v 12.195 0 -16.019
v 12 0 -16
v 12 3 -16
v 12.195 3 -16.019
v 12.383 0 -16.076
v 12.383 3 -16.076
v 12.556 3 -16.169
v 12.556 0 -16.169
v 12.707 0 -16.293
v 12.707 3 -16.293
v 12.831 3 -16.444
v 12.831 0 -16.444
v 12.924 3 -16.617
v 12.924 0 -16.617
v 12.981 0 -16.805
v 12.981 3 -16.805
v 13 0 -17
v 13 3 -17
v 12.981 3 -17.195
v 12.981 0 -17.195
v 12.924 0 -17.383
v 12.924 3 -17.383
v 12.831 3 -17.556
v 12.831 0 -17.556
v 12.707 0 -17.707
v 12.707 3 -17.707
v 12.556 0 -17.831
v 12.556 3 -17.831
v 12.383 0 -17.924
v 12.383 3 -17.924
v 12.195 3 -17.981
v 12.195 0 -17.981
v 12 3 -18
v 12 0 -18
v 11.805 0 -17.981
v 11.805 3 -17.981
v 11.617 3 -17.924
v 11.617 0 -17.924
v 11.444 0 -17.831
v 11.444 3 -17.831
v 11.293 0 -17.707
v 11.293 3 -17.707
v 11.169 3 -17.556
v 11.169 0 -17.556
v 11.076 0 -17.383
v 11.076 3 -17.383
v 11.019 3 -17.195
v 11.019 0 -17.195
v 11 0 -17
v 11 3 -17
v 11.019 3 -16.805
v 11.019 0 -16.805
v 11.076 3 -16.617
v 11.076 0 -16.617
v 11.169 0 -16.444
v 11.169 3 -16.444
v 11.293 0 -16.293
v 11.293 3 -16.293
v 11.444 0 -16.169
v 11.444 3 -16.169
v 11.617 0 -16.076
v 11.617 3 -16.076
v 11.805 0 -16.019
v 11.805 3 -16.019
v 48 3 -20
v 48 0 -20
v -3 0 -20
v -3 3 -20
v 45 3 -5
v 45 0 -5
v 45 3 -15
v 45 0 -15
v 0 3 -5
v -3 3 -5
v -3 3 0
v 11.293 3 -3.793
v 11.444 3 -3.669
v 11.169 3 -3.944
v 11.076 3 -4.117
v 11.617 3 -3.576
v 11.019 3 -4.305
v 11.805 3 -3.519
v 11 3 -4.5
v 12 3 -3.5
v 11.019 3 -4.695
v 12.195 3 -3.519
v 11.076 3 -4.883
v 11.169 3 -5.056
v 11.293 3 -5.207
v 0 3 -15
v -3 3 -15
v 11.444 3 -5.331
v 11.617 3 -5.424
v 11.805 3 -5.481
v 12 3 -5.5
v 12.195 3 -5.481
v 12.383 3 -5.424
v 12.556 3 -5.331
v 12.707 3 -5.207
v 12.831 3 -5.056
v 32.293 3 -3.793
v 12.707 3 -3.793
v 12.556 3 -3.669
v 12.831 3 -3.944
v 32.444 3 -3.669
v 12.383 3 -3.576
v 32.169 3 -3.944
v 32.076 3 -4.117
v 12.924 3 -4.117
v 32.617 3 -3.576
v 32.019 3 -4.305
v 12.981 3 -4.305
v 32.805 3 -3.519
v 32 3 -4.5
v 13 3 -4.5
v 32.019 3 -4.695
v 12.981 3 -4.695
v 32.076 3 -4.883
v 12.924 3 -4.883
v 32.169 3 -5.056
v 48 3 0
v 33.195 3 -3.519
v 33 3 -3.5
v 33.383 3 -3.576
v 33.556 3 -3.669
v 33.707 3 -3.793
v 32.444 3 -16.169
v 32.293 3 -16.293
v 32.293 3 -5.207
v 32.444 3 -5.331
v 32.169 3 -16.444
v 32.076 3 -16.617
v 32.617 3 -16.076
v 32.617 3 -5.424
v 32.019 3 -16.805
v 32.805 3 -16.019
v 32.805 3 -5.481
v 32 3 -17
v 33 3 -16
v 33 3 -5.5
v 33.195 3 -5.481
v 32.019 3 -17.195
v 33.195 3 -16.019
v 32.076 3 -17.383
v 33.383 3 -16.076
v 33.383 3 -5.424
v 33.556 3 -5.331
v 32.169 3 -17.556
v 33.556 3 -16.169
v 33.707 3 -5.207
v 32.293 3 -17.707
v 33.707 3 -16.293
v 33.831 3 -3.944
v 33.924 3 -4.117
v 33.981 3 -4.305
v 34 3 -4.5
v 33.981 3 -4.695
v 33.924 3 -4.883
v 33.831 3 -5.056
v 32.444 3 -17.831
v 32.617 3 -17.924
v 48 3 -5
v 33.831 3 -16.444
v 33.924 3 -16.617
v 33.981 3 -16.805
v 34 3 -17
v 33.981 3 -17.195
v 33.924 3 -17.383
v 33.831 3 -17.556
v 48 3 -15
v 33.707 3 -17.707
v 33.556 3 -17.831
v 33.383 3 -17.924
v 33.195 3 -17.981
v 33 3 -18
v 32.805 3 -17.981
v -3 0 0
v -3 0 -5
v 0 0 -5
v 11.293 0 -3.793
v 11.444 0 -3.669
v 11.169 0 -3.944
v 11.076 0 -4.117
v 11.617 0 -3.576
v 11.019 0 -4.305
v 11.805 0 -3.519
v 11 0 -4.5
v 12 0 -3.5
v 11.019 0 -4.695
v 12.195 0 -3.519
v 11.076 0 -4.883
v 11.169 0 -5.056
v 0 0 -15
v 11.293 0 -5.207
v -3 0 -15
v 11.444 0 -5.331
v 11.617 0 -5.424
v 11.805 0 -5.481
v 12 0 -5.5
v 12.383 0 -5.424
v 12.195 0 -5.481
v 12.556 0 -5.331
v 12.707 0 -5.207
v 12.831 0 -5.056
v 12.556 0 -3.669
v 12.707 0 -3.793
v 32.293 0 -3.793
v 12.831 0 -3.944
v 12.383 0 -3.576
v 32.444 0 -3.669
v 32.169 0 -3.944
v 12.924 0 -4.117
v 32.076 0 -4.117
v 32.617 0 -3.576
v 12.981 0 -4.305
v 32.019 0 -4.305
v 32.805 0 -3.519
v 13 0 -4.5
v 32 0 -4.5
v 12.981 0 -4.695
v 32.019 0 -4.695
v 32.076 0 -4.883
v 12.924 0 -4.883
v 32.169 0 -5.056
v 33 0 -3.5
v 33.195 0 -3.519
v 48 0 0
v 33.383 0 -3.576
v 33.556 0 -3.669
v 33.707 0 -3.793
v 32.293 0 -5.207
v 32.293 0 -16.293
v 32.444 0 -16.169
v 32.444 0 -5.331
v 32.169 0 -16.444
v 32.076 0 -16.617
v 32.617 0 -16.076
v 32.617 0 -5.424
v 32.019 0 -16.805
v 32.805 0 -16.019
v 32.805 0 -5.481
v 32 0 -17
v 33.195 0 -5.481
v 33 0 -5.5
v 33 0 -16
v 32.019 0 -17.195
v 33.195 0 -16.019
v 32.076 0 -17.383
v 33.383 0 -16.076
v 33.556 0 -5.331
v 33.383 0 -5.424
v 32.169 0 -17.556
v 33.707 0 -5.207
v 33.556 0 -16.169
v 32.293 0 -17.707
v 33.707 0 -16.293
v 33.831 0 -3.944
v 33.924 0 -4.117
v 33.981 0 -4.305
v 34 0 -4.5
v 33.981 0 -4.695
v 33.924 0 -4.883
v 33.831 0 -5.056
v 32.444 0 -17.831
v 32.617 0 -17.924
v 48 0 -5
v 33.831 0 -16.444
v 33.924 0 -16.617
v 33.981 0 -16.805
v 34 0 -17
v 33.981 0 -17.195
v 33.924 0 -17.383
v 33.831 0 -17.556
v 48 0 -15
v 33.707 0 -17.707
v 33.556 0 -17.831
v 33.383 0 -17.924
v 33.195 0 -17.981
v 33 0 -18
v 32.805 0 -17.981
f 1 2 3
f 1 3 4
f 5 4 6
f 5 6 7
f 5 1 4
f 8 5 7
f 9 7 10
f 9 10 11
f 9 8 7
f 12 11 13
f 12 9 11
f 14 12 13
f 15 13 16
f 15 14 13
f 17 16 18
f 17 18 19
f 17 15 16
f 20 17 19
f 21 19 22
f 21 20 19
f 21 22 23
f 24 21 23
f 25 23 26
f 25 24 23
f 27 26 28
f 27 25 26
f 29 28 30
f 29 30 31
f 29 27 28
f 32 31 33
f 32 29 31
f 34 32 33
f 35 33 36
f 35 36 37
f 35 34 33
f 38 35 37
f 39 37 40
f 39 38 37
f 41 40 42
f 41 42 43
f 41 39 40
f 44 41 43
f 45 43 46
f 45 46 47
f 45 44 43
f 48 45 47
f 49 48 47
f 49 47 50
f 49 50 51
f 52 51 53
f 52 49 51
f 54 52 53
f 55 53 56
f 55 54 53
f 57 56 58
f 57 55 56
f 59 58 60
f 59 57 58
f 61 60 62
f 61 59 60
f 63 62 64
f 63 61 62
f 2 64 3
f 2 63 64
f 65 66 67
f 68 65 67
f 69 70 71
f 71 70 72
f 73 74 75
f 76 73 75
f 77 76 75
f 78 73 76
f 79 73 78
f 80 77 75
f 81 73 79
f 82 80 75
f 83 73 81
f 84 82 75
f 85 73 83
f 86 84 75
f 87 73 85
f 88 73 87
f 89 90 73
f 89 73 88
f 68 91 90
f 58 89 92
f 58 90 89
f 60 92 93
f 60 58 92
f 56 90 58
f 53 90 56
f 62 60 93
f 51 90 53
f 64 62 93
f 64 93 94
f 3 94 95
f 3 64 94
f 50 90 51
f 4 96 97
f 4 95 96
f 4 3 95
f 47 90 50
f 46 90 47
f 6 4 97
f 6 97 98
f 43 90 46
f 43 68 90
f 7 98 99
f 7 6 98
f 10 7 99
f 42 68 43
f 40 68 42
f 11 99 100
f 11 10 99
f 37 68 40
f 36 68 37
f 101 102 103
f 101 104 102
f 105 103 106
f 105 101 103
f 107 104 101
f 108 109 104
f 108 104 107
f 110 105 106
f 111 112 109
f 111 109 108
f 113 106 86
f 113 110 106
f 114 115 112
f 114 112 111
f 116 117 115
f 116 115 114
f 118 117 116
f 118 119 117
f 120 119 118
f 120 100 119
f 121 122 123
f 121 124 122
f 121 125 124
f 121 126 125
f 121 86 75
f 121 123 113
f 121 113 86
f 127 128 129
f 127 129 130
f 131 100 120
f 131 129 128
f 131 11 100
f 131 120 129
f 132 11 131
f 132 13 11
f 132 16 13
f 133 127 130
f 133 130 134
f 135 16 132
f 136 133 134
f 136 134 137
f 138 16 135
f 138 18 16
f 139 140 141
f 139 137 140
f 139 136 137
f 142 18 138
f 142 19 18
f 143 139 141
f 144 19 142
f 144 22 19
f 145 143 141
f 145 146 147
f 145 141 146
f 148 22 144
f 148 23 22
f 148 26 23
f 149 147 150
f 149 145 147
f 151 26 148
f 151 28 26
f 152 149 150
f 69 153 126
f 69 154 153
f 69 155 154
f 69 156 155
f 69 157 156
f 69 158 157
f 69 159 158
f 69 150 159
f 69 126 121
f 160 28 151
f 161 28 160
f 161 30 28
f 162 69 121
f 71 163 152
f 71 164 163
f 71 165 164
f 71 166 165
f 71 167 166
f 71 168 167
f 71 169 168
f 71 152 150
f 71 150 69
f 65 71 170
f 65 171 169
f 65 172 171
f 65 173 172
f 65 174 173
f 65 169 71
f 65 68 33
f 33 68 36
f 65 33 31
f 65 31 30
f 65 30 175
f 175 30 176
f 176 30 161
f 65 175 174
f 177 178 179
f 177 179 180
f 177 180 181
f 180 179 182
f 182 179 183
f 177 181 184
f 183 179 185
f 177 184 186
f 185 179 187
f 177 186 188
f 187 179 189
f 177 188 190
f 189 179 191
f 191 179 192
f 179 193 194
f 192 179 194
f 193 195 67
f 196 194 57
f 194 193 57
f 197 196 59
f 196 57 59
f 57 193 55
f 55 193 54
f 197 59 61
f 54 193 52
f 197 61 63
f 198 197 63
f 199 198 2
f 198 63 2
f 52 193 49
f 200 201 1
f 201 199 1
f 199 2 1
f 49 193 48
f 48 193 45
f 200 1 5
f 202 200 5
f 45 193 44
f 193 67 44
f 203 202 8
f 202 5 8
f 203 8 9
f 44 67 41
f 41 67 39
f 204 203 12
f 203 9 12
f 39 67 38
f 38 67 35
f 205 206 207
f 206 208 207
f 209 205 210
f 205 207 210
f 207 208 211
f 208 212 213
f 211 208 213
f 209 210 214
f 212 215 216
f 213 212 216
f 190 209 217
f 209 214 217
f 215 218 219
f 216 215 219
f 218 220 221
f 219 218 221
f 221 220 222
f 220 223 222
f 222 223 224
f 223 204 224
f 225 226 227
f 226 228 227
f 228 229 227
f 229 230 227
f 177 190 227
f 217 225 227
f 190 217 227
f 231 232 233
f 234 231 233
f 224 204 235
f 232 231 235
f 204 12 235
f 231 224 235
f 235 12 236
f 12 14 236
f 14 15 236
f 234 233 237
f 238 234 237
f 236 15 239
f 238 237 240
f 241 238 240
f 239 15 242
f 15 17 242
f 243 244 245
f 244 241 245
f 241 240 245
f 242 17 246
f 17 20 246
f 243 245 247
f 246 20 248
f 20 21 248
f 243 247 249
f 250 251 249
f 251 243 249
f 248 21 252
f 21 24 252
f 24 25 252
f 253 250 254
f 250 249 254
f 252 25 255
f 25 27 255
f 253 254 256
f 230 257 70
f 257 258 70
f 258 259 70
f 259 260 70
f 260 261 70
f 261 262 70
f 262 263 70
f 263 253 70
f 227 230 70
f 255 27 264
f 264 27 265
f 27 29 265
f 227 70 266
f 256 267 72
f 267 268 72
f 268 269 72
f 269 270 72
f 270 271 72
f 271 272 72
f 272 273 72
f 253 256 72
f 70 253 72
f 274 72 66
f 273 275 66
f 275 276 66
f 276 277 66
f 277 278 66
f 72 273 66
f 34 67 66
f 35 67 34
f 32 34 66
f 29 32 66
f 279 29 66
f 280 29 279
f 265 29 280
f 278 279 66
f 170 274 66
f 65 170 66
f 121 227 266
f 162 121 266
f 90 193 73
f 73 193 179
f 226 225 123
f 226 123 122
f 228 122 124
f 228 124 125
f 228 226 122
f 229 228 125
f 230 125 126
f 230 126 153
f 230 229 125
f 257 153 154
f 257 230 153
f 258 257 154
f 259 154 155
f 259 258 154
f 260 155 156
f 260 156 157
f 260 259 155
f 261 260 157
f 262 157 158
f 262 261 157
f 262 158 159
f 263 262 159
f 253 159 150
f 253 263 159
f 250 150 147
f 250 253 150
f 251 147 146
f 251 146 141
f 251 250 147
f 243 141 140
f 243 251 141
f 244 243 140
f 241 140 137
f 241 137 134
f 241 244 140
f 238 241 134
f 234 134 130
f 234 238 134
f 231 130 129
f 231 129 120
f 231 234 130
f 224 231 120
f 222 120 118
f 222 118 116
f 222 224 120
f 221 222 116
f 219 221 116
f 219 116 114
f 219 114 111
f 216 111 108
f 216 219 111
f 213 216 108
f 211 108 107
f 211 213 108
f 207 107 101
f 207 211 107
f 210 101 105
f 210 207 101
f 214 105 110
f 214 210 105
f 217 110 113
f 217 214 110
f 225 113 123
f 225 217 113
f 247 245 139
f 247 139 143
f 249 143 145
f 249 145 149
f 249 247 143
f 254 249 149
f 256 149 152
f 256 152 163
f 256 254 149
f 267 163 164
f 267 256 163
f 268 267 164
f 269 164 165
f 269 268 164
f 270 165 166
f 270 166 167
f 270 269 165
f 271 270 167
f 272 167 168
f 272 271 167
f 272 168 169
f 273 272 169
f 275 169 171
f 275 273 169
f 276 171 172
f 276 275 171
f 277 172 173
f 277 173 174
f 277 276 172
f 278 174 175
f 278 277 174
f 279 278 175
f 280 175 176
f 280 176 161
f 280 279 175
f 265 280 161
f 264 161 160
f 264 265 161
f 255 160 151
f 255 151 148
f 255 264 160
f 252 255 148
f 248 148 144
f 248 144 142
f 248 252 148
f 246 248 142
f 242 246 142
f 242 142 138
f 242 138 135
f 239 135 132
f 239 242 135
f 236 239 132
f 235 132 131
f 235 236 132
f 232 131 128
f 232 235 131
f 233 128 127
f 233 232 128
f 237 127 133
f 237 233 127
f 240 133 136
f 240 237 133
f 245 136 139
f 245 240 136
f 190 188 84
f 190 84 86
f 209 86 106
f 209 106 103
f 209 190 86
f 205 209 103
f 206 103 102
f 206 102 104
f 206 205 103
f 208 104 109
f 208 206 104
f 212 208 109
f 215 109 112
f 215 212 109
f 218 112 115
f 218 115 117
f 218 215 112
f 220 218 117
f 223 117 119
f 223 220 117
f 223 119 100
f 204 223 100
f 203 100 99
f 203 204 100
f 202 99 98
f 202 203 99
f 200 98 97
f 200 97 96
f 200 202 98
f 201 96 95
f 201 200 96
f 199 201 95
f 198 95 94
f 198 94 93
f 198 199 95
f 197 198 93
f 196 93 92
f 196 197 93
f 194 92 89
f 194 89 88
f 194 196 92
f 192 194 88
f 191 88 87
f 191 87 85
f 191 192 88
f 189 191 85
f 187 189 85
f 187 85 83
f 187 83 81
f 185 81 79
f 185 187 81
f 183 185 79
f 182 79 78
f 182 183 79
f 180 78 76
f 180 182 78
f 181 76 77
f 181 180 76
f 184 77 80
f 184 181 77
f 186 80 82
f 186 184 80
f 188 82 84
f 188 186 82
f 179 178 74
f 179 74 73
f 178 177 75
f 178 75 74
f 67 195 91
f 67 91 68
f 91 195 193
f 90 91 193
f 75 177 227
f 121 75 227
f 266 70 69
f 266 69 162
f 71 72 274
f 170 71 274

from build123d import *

# Parameters (mm, degrees)
SKETCH1_W           = 3
SKETCH1_H           = 5
SKETCH1_R           = 1
BOSS_EXTRUDE1_DEPTH = 3


with BuildPart() as part:
    # Sketch1 → Boss-Extrude1 (new body)
    # profile 1 of 6: a face of its own
    with BuildSketch(Plane(origin=(0, 0, 0), x_dir=(1, 0, 0), z_dir=(0, 1, 0))):
        with Locations((-1.5, 17.5)):
            Rectangle(SKETCH1_W, SKETCH1_H)
    # profile 2 of 6: a face of its own
    with BuildSketch(Plane(origin=(0, 0, 0), x_dir=(1, 0, 0), z_dir=(0, 1, 0))):
        Polygon((22.5, 0), (22.5, 20), (0, 20), (0, 15), (0, 5), (0, 0), align=None)
        with Locations(Location((12, 4.5, 0), (0, 0, 270))):
            Circle(SKETCH1_R, mode=Mode.SUBTRACT)
        with Locations(Location((12, 17, 0), (0, 0, 270))):
            Circle(SKETCH1_R, mode=Mode.SUBTRACT)
    # profile 3 of 6: a face of its own
    with BuildSketch(Plane(origin=(0, 0, 0), x_dir=(1, 0, 0), z_dir=(0, 1, 0))):
        Polygon((45, 20), (22.5, 20), (22.5, 0), (45, 0), (45, 5), (45, 15), align=None)
        with Locations(Location((33, 4.5, 0), (0, 0, 270))):
            Circle(SKETCH1_R, mode=Mode.SUBTRACT)
        with Locations(Location((33, 17, 0), (0, 0, 270))):
            Circle(SKETCH1_R, mode=Mode.SUBTRACT)
    # profile 4 of 6: a face of its own
    with BuildSketch(Plane(origin=(0, 0, 0), x_dir=(1, 0, 0), z_dir=(0, 1, 0))):
        with Locations((46.5, 17.5)):
            Rectangle(SKETCH1_W, SKETCH1_H)
    # profile 5 of 6: a face of its own
    with BuildSketch(Plane(origin=(0, 0, 0), x_dir=(1, 0, 0), z_dir=(0, 1, 0))):
        with Locations((-1.5, 2.5)):
            Rectangle(SKETCH1_W, SKETCH1_H)
    # profile 6 of 6: a face of its own
    with BuildSketch(Plane(origin=(0, 0, 0), x_dir=(1, 0, 0), z_dir=(0, 1, 0))):
        with Locations((46.5, 2.5)):
            Rectangle(SKETCH1_W, SKETCH1_H)
    extrude(amount=BOSS_EXTRUDE1_DEPTH)


solid = part.part
